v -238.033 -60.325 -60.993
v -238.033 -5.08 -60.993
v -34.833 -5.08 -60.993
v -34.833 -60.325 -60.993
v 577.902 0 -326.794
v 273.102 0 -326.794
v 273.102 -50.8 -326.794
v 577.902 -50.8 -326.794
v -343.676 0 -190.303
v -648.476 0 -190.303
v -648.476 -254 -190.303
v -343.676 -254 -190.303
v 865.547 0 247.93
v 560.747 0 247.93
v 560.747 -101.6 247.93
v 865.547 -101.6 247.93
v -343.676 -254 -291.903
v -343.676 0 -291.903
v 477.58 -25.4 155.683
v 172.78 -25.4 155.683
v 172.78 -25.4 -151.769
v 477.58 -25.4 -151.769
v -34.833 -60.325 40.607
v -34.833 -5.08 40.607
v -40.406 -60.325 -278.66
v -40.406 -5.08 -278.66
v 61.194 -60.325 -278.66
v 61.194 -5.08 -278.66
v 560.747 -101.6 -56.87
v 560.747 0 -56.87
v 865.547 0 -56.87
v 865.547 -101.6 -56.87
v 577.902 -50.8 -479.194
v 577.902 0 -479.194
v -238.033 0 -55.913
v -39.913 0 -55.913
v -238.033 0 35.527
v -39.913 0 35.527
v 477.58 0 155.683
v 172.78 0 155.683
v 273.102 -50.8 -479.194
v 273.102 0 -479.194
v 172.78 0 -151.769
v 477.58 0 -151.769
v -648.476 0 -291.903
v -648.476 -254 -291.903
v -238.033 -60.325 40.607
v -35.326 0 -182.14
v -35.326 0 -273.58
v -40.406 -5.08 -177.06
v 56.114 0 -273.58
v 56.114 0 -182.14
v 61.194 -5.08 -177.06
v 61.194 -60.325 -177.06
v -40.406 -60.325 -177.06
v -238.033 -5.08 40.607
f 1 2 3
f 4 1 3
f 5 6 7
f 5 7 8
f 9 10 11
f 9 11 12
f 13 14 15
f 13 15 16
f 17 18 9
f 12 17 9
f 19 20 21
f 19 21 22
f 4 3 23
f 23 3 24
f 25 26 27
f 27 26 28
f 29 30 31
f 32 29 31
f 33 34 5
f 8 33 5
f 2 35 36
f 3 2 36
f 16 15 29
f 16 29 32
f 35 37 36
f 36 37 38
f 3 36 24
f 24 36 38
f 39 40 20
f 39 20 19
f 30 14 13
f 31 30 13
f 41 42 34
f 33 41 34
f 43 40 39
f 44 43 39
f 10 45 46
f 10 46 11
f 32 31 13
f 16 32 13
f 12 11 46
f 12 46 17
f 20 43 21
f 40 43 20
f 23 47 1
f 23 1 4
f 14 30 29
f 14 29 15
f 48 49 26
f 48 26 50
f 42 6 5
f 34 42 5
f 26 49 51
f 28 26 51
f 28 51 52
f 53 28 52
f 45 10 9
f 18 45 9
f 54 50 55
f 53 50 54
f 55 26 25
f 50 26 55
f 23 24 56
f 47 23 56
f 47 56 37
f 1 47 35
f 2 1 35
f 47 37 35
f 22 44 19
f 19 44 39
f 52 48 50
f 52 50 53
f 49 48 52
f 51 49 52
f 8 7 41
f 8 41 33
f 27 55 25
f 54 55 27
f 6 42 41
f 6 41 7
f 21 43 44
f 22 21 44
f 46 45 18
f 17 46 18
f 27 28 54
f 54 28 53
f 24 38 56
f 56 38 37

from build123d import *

# Parameters (mm, degrees)
F1_DEPTH  = 60.325
F2_SIZE   = 5.08
F3_W      = 304.8
F3_H      = 307.4512779713
F4_DEPTH  = 25.4
F5_W      = 304.8
F5_H      = 304.8
F6_DEPTH  = 101.6
F7_W      = 101.6
F7_H      = 101.6
F8_DEPTH  = 60.325
F9_SIZE   = 5.08
F10_W     = 304.8
F10_H     = 152.4
F11_DEPTH = 50.8
F12_W     = 304.8
F12_H     = 101.6
F13_DEPTH = 254


with BuildPart() as f1:
    # F0 (on Front) → F1 (new body)
    with BuildSketch(Plane.XZ):
        Polygon((-34.8327495575, 40.6072164297), (-238.0327495575, 40.6072164297), (-238.0327495575, -60.9927835703), (-135.3522986174, -60.9927835703), (-34.8327495575, -60.9927835703), align=None)
    extrude(amount=F1_DEPTH)

    # F2
    f2_edges = [f1.edges().sort_by_distance(p)[0] for p in [
        (-136.43275, 0, -60.992784),
        (-136.43275, 0, 40.607216),
        (-34.83275, 0, -10.192784),
    ]]
    chamfer(f2_edges, length=F2_SIZE)


with BuildPart() as f4:
    # F3 (on Front) → F4 (new body)
    with BuildSketch(Plane.XZ):
        with Locations((325.1804988623, 1.9569396973)):
            Rectangle(F3_W, F3_H)
    extrude(amount=F4_DEPTH)


with BuildPart() as f6:
    # F5 (on Front) → F6 (new body)
    with BuildSketch(Plane.XZ):
        with Locations((713.1468355656, 95.5299821684)):
            Rectangle(F5_W, F5_H)
    extrude(amount=F6_DEPTH)


with BuildPart() as f8:
    # F7 (on Front) → F8 (new body)
    with BuildSketch(Plane.XZ):
        with Locations((10.3937499225, -227.8598965335)):
            Rectangle(F7_W, F7_H)
    extrude(amount=F8_DEPTH)

    # F9
    f9_edges = [f8.edges().sort_by_distance(p)[0] for p in [
        (61.19375, 0, -227.859897),
        (10.39375, 0, -278.659897),
        (-40.40625, 0, -227.859897),
        (10.39375, 0, -177.059897),
    ]]
    chamfer(f9_edges, length=F9_SIZE)


with BuildPart() as f11:
    # F10 (on Front) → F11 (new body)
    with BuildSketch(Plane.XZ):
        with Locations((425.5021352335, -402.9936790466)):
            Rectangle(F10_W, F10_H)
    extrude(amount=F11_DEPTH)


with BuildPart() as f13:
    # F12 (on Front) → F13 (new body)
    with BuildSketch(Plane.XZ):
        with Locations((-496.0762047155, -241.1027252674)):
            Rectangle(F12_W, F12_H)
    extrude(amount=F13_DEPTH)


solid = Compound([f1.part, f4.part, f6.part, f8.part, f11.part, f13.part])
